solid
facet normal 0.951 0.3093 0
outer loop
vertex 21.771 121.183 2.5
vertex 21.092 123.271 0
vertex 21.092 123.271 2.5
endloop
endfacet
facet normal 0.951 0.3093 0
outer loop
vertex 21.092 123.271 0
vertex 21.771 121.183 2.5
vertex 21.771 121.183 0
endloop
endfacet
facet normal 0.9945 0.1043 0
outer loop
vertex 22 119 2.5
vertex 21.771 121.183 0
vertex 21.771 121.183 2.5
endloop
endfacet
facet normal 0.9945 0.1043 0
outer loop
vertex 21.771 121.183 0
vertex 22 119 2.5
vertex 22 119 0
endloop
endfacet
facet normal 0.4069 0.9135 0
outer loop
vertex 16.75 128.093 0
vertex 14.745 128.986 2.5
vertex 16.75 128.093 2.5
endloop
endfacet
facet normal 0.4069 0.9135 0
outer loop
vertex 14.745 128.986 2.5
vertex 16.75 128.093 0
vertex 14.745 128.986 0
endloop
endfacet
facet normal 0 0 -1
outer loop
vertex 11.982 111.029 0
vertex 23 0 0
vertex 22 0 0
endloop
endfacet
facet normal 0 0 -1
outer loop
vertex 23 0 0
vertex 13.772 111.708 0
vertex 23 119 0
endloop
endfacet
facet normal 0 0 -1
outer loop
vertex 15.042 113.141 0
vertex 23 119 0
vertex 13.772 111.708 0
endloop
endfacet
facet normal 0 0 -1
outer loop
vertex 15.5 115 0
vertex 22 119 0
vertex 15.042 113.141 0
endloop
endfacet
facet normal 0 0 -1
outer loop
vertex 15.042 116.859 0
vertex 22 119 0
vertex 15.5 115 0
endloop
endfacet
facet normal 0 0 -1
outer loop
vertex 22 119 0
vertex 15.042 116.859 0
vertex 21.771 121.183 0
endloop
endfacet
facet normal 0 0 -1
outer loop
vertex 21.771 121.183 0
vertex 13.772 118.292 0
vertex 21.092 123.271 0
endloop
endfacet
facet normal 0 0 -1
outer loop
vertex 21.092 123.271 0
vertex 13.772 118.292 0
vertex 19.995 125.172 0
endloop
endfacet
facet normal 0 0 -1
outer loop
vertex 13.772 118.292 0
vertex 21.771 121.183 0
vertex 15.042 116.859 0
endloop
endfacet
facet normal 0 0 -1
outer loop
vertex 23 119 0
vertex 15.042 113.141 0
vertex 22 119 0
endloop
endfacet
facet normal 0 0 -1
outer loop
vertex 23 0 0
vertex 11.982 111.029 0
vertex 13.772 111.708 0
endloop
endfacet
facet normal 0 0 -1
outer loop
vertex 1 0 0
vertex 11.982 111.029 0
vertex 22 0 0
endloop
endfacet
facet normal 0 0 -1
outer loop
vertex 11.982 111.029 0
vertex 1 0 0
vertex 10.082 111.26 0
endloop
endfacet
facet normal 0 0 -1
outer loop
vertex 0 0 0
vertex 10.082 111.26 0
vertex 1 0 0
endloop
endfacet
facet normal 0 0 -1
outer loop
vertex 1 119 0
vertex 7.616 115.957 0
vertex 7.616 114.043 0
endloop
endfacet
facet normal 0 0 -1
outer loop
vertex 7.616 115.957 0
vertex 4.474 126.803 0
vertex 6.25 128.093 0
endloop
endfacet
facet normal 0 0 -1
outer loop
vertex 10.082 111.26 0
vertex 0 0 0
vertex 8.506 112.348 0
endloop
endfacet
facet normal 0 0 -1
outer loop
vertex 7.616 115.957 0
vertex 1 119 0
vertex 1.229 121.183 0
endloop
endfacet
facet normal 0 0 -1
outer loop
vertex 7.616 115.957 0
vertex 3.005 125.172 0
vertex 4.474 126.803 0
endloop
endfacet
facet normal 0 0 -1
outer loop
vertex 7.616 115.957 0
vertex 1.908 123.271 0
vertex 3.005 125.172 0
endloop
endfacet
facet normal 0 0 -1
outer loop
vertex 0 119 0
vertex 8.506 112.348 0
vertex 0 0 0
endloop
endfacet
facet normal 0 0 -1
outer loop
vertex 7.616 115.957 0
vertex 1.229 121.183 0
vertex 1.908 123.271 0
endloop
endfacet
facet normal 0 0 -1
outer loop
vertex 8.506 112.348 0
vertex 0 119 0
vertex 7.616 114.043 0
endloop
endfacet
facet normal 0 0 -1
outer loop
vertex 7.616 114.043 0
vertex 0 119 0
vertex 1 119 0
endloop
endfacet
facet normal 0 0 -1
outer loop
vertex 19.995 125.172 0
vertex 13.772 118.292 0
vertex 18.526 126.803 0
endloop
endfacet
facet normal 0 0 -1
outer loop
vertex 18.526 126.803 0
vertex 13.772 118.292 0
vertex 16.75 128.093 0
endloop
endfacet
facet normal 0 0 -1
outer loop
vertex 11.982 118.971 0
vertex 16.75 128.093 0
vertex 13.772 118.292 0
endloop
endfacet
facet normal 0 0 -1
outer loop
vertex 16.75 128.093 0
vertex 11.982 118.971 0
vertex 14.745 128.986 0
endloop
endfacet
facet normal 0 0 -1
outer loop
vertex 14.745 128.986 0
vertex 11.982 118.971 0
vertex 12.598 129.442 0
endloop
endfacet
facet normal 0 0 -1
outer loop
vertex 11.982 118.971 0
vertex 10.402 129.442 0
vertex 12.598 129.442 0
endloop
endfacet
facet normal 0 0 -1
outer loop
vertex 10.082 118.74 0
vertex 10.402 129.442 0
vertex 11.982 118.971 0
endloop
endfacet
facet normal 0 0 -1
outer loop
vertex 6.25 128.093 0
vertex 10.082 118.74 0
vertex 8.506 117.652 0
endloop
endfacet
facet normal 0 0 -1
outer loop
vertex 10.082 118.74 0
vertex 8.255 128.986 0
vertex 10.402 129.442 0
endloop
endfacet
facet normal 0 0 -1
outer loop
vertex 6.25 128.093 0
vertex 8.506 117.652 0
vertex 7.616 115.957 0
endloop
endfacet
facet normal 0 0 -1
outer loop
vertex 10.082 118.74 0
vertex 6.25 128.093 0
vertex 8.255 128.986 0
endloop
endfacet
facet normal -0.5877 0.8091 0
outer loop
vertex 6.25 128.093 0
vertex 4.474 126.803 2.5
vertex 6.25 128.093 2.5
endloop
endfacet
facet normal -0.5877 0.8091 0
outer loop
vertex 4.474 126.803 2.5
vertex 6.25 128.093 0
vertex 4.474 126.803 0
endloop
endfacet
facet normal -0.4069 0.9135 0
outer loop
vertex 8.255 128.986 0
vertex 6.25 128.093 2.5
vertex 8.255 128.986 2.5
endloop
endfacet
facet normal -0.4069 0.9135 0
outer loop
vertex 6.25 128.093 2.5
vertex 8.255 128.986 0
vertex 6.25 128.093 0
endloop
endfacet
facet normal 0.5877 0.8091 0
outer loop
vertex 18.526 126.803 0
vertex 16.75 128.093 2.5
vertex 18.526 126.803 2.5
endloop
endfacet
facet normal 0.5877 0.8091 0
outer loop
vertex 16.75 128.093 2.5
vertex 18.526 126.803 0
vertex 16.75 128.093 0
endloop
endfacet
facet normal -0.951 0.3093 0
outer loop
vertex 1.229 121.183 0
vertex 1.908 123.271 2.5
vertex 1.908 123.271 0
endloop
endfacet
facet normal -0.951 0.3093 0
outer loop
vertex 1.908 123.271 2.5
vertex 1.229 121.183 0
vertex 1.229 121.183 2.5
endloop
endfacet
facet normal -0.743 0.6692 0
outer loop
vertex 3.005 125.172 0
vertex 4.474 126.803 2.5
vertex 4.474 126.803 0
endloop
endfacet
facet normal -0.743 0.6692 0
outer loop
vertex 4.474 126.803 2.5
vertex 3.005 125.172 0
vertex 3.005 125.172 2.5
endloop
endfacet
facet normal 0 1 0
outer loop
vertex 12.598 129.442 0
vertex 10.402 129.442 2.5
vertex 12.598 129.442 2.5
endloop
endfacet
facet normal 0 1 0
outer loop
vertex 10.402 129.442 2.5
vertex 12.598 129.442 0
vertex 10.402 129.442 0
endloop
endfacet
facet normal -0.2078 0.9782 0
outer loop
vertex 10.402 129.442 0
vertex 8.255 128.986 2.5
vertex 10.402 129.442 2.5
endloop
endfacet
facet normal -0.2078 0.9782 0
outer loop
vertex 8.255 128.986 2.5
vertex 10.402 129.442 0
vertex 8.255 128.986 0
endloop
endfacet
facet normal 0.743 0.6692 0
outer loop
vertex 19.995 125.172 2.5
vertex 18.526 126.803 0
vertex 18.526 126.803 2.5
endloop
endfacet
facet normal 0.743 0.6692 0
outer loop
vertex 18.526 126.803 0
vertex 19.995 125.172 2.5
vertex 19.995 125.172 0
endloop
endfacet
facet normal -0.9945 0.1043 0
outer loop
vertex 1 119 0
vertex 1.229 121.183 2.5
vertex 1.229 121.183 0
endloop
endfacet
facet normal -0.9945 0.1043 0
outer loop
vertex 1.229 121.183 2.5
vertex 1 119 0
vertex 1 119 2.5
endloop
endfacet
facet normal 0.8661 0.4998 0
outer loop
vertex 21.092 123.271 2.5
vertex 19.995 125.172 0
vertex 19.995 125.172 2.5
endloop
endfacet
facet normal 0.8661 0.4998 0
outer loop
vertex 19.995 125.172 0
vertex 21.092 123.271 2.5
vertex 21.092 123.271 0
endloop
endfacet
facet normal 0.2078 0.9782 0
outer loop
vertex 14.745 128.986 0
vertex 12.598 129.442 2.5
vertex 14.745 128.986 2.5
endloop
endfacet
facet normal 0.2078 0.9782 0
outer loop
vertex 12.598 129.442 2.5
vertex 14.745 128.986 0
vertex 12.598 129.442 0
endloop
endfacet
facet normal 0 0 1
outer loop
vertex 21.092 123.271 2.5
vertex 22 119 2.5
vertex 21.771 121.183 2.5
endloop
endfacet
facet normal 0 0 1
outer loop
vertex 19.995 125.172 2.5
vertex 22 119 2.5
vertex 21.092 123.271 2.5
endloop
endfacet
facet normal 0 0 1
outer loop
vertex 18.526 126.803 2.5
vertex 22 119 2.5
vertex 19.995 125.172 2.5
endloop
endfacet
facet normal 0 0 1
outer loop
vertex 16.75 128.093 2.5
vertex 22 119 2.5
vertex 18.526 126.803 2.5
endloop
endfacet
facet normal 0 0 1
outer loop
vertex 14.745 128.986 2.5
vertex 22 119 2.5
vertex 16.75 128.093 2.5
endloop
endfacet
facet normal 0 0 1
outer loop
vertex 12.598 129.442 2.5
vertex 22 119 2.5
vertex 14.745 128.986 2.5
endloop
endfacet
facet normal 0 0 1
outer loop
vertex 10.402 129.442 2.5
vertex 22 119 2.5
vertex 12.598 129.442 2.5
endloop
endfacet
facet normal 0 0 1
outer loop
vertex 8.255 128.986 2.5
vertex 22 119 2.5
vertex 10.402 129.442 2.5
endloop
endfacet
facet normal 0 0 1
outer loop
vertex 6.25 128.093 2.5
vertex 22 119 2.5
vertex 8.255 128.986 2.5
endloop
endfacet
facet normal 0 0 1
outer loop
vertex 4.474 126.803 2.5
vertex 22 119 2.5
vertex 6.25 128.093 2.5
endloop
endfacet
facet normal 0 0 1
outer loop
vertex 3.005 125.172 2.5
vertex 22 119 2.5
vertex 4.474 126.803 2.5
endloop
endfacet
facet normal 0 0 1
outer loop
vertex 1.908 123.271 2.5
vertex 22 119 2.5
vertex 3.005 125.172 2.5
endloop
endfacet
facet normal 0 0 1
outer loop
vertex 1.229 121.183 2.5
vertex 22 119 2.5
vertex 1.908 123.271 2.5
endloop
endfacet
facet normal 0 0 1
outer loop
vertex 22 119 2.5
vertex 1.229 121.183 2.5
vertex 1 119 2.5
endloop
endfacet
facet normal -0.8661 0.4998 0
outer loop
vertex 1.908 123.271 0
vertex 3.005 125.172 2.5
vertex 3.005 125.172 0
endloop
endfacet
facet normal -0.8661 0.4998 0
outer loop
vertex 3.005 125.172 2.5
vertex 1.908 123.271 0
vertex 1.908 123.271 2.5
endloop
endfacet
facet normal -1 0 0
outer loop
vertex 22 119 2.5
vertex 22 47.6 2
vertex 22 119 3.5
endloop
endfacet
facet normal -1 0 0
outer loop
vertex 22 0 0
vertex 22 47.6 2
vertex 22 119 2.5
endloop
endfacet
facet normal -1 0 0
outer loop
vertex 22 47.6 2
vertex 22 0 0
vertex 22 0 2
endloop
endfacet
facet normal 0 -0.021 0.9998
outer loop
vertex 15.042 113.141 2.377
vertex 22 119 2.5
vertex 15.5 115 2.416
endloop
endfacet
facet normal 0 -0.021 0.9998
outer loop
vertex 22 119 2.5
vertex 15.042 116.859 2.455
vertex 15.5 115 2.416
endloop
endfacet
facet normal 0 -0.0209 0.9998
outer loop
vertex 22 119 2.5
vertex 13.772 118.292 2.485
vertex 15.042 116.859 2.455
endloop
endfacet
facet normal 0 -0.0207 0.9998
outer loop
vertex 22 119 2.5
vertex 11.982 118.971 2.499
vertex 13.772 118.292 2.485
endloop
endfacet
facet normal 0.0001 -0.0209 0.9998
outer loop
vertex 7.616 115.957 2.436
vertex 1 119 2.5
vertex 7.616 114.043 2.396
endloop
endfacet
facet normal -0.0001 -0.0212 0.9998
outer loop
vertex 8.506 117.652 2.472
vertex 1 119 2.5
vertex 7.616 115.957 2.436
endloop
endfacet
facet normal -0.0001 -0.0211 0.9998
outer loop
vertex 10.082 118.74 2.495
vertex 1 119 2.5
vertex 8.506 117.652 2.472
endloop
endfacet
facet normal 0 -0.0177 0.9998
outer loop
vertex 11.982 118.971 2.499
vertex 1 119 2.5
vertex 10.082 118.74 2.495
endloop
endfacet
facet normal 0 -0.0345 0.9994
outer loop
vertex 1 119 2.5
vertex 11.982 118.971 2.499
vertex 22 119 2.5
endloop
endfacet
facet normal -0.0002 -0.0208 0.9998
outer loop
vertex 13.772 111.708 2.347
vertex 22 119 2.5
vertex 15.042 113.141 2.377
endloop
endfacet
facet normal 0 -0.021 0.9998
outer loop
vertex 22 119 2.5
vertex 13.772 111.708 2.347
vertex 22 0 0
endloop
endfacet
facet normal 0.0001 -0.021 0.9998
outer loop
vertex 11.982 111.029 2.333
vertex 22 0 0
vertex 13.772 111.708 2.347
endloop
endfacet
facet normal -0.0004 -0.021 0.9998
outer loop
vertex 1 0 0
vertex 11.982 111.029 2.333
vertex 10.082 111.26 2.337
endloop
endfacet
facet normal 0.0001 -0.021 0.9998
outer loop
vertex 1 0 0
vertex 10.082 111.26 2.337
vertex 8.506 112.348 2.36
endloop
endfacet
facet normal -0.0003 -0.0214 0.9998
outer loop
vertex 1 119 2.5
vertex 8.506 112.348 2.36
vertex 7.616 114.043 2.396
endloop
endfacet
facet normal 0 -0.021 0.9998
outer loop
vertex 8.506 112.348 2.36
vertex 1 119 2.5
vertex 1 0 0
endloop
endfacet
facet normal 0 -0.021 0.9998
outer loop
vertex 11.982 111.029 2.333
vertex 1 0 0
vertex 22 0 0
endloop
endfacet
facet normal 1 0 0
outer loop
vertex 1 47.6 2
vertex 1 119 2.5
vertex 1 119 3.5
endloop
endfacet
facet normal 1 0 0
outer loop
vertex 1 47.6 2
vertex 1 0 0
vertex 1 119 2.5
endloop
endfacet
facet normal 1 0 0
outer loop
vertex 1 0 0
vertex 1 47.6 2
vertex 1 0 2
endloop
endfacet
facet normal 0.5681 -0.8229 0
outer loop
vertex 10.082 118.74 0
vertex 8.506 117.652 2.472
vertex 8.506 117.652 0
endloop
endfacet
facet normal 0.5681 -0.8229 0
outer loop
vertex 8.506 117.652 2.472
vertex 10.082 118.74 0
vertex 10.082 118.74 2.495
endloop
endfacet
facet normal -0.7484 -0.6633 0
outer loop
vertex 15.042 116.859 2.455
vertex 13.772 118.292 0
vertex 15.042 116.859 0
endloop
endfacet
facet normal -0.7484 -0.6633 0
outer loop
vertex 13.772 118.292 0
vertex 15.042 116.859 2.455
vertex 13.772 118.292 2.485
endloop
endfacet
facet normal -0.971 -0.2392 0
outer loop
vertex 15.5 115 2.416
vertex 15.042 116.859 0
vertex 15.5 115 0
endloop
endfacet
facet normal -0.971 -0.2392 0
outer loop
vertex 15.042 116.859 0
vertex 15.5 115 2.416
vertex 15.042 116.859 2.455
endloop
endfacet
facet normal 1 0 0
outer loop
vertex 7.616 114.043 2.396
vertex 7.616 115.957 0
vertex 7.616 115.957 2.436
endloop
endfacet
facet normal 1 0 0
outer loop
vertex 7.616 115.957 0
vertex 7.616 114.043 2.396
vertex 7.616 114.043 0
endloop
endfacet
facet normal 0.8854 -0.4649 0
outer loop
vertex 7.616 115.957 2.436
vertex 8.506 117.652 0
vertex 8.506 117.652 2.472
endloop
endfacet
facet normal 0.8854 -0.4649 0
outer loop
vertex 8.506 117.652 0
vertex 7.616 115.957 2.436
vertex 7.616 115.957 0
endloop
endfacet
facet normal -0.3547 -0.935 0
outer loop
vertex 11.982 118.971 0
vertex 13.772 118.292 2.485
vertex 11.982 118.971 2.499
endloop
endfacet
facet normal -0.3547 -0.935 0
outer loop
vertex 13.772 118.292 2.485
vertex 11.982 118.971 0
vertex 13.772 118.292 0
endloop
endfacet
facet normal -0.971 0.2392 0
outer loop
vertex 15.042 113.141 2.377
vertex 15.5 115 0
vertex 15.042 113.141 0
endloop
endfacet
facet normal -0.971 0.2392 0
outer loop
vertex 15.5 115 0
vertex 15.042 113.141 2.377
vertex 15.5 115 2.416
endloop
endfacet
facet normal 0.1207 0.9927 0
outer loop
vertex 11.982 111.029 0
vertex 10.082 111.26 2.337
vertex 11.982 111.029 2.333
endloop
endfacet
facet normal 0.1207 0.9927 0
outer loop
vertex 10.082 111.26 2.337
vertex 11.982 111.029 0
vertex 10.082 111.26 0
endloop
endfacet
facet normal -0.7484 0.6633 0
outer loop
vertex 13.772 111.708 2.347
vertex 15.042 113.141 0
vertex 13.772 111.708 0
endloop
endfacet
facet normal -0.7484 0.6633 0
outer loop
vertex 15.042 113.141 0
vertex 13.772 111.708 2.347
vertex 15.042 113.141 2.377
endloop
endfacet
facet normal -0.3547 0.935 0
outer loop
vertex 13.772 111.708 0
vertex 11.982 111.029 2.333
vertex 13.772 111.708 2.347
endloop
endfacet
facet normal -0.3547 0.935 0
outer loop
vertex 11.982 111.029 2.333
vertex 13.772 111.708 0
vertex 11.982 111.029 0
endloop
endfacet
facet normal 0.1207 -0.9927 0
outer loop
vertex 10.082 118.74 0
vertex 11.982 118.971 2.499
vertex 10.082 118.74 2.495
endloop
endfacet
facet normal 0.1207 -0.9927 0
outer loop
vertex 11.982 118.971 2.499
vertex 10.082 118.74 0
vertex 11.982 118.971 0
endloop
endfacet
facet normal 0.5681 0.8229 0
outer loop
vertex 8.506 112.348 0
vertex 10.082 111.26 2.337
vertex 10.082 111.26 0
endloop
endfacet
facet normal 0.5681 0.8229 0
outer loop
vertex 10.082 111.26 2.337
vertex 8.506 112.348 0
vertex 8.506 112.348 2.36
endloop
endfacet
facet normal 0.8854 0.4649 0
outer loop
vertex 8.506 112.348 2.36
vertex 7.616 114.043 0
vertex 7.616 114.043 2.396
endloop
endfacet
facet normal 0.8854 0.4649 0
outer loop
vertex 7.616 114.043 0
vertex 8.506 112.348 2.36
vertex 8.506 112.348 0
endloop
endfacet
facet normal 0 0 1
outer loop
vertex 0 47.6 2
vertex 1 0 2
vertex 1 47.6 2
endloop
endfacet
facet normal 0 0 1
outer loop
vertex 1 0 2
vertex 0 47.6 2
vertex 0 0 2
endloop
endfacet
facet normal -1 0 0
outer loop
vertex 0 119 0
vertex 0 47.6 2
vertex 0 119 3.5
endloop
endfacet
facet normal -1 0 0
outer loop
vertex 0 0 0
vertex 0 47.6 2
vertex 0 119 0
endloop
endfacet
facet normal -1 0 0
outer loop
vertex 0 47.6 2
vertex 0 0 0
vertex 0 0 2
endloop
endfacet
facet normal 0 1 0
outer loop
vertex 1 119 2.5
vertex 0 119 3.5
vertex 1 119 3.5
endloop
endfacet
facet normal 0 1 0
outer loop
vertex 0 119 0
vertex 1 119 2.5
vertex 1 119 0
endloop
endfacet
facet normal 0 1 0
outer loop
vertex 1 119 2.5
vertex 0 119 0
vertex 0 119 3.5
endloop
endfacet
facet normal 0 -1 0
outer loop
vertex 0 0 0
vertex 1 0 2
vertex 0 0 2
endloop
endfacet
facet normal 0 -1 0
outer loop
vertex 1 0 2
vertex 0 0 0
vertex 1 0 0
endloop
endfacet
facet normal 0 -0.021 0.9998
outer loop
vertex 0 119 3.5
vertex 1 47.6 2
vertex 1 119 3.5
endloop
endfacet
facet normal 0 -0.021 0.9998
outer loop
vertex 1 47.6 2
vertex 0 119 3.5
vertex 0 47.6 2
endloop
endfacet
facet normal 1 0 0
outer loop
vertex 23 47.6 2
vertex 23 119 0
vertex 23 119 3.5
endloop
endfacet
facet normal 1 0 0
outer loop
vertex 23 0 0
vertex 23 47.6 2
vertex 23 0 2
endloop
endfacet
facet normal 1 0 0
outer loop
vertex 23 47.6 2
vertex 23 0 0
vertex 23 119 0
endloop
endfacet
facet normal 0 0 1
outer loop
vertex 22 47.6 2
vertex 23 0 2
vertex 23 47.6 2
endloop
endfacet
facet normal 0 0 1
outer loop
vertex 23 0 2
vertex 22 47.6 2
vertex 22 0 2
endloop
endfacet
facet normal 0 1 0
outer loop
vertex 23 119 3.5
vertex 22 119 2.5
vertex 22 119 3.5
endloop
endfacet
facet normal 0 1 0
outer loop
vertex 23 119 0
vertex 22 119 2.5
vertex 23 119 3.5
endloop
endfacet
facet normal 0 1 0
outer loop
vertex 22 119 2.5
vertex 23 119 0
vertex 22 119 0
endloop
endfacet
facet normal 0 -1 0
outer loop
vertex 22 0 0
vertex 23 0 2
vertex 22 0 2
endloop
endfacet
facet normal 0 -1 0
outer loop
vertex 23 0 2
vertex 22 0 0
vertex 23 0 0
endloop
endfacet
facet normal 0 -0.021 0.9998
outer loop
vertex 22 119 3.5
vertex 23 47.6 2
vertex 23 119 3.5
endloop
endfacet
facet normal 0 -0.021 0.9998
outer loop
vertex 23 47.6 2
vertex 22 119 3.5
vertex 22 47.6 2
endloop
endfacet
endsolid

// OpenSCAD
w=119;
s=21;
h=2.5;


module wedge(width, span, height)
{
  polyhedron(
    points=[
             [0, 0, 0],
             [span, 0, 0],
             [span, width, 0],
             [0, width, 0],
             [0, width, height],
             [span, width, height],
           ],
    faces=[
            // bottom
            [0,1,2],
            [2,3,0],
            // sides
            [5,2,1],
            [0,3,4],
            // back
            [3,2,4],
            [5,4,2],
            // top
            [0,4,5],
            [5,1,0],
          ]
   );
};


module fence(width, height)
{
  cube([width, 119, height-h]);
  translate([0,0,1])
    wedge(width=w, span=1, height=h);
}


module support()
{
  translate([1,0,0])
  {
    difference()
    {
      union()
      {
        wedge(width=w, span=s, height=h);

        // rounded ending
        translate([s/2, w, 0])
          difference()
          {
            cylinder(r=s/2, h=h);
            translate([-s/2, -s/2*2, 0])
              cube([s, s, h]);
          }
      }

      // screw hole
      translate([s/2, w-8/2, 0])
        cylinder(r=8/2, h=h);
    }
  }

  // side walls
  for(i=[0, s+1])
    translate(i*[1,0,0])
      fence(width=1, height=h+2);
}

support(2.5);
